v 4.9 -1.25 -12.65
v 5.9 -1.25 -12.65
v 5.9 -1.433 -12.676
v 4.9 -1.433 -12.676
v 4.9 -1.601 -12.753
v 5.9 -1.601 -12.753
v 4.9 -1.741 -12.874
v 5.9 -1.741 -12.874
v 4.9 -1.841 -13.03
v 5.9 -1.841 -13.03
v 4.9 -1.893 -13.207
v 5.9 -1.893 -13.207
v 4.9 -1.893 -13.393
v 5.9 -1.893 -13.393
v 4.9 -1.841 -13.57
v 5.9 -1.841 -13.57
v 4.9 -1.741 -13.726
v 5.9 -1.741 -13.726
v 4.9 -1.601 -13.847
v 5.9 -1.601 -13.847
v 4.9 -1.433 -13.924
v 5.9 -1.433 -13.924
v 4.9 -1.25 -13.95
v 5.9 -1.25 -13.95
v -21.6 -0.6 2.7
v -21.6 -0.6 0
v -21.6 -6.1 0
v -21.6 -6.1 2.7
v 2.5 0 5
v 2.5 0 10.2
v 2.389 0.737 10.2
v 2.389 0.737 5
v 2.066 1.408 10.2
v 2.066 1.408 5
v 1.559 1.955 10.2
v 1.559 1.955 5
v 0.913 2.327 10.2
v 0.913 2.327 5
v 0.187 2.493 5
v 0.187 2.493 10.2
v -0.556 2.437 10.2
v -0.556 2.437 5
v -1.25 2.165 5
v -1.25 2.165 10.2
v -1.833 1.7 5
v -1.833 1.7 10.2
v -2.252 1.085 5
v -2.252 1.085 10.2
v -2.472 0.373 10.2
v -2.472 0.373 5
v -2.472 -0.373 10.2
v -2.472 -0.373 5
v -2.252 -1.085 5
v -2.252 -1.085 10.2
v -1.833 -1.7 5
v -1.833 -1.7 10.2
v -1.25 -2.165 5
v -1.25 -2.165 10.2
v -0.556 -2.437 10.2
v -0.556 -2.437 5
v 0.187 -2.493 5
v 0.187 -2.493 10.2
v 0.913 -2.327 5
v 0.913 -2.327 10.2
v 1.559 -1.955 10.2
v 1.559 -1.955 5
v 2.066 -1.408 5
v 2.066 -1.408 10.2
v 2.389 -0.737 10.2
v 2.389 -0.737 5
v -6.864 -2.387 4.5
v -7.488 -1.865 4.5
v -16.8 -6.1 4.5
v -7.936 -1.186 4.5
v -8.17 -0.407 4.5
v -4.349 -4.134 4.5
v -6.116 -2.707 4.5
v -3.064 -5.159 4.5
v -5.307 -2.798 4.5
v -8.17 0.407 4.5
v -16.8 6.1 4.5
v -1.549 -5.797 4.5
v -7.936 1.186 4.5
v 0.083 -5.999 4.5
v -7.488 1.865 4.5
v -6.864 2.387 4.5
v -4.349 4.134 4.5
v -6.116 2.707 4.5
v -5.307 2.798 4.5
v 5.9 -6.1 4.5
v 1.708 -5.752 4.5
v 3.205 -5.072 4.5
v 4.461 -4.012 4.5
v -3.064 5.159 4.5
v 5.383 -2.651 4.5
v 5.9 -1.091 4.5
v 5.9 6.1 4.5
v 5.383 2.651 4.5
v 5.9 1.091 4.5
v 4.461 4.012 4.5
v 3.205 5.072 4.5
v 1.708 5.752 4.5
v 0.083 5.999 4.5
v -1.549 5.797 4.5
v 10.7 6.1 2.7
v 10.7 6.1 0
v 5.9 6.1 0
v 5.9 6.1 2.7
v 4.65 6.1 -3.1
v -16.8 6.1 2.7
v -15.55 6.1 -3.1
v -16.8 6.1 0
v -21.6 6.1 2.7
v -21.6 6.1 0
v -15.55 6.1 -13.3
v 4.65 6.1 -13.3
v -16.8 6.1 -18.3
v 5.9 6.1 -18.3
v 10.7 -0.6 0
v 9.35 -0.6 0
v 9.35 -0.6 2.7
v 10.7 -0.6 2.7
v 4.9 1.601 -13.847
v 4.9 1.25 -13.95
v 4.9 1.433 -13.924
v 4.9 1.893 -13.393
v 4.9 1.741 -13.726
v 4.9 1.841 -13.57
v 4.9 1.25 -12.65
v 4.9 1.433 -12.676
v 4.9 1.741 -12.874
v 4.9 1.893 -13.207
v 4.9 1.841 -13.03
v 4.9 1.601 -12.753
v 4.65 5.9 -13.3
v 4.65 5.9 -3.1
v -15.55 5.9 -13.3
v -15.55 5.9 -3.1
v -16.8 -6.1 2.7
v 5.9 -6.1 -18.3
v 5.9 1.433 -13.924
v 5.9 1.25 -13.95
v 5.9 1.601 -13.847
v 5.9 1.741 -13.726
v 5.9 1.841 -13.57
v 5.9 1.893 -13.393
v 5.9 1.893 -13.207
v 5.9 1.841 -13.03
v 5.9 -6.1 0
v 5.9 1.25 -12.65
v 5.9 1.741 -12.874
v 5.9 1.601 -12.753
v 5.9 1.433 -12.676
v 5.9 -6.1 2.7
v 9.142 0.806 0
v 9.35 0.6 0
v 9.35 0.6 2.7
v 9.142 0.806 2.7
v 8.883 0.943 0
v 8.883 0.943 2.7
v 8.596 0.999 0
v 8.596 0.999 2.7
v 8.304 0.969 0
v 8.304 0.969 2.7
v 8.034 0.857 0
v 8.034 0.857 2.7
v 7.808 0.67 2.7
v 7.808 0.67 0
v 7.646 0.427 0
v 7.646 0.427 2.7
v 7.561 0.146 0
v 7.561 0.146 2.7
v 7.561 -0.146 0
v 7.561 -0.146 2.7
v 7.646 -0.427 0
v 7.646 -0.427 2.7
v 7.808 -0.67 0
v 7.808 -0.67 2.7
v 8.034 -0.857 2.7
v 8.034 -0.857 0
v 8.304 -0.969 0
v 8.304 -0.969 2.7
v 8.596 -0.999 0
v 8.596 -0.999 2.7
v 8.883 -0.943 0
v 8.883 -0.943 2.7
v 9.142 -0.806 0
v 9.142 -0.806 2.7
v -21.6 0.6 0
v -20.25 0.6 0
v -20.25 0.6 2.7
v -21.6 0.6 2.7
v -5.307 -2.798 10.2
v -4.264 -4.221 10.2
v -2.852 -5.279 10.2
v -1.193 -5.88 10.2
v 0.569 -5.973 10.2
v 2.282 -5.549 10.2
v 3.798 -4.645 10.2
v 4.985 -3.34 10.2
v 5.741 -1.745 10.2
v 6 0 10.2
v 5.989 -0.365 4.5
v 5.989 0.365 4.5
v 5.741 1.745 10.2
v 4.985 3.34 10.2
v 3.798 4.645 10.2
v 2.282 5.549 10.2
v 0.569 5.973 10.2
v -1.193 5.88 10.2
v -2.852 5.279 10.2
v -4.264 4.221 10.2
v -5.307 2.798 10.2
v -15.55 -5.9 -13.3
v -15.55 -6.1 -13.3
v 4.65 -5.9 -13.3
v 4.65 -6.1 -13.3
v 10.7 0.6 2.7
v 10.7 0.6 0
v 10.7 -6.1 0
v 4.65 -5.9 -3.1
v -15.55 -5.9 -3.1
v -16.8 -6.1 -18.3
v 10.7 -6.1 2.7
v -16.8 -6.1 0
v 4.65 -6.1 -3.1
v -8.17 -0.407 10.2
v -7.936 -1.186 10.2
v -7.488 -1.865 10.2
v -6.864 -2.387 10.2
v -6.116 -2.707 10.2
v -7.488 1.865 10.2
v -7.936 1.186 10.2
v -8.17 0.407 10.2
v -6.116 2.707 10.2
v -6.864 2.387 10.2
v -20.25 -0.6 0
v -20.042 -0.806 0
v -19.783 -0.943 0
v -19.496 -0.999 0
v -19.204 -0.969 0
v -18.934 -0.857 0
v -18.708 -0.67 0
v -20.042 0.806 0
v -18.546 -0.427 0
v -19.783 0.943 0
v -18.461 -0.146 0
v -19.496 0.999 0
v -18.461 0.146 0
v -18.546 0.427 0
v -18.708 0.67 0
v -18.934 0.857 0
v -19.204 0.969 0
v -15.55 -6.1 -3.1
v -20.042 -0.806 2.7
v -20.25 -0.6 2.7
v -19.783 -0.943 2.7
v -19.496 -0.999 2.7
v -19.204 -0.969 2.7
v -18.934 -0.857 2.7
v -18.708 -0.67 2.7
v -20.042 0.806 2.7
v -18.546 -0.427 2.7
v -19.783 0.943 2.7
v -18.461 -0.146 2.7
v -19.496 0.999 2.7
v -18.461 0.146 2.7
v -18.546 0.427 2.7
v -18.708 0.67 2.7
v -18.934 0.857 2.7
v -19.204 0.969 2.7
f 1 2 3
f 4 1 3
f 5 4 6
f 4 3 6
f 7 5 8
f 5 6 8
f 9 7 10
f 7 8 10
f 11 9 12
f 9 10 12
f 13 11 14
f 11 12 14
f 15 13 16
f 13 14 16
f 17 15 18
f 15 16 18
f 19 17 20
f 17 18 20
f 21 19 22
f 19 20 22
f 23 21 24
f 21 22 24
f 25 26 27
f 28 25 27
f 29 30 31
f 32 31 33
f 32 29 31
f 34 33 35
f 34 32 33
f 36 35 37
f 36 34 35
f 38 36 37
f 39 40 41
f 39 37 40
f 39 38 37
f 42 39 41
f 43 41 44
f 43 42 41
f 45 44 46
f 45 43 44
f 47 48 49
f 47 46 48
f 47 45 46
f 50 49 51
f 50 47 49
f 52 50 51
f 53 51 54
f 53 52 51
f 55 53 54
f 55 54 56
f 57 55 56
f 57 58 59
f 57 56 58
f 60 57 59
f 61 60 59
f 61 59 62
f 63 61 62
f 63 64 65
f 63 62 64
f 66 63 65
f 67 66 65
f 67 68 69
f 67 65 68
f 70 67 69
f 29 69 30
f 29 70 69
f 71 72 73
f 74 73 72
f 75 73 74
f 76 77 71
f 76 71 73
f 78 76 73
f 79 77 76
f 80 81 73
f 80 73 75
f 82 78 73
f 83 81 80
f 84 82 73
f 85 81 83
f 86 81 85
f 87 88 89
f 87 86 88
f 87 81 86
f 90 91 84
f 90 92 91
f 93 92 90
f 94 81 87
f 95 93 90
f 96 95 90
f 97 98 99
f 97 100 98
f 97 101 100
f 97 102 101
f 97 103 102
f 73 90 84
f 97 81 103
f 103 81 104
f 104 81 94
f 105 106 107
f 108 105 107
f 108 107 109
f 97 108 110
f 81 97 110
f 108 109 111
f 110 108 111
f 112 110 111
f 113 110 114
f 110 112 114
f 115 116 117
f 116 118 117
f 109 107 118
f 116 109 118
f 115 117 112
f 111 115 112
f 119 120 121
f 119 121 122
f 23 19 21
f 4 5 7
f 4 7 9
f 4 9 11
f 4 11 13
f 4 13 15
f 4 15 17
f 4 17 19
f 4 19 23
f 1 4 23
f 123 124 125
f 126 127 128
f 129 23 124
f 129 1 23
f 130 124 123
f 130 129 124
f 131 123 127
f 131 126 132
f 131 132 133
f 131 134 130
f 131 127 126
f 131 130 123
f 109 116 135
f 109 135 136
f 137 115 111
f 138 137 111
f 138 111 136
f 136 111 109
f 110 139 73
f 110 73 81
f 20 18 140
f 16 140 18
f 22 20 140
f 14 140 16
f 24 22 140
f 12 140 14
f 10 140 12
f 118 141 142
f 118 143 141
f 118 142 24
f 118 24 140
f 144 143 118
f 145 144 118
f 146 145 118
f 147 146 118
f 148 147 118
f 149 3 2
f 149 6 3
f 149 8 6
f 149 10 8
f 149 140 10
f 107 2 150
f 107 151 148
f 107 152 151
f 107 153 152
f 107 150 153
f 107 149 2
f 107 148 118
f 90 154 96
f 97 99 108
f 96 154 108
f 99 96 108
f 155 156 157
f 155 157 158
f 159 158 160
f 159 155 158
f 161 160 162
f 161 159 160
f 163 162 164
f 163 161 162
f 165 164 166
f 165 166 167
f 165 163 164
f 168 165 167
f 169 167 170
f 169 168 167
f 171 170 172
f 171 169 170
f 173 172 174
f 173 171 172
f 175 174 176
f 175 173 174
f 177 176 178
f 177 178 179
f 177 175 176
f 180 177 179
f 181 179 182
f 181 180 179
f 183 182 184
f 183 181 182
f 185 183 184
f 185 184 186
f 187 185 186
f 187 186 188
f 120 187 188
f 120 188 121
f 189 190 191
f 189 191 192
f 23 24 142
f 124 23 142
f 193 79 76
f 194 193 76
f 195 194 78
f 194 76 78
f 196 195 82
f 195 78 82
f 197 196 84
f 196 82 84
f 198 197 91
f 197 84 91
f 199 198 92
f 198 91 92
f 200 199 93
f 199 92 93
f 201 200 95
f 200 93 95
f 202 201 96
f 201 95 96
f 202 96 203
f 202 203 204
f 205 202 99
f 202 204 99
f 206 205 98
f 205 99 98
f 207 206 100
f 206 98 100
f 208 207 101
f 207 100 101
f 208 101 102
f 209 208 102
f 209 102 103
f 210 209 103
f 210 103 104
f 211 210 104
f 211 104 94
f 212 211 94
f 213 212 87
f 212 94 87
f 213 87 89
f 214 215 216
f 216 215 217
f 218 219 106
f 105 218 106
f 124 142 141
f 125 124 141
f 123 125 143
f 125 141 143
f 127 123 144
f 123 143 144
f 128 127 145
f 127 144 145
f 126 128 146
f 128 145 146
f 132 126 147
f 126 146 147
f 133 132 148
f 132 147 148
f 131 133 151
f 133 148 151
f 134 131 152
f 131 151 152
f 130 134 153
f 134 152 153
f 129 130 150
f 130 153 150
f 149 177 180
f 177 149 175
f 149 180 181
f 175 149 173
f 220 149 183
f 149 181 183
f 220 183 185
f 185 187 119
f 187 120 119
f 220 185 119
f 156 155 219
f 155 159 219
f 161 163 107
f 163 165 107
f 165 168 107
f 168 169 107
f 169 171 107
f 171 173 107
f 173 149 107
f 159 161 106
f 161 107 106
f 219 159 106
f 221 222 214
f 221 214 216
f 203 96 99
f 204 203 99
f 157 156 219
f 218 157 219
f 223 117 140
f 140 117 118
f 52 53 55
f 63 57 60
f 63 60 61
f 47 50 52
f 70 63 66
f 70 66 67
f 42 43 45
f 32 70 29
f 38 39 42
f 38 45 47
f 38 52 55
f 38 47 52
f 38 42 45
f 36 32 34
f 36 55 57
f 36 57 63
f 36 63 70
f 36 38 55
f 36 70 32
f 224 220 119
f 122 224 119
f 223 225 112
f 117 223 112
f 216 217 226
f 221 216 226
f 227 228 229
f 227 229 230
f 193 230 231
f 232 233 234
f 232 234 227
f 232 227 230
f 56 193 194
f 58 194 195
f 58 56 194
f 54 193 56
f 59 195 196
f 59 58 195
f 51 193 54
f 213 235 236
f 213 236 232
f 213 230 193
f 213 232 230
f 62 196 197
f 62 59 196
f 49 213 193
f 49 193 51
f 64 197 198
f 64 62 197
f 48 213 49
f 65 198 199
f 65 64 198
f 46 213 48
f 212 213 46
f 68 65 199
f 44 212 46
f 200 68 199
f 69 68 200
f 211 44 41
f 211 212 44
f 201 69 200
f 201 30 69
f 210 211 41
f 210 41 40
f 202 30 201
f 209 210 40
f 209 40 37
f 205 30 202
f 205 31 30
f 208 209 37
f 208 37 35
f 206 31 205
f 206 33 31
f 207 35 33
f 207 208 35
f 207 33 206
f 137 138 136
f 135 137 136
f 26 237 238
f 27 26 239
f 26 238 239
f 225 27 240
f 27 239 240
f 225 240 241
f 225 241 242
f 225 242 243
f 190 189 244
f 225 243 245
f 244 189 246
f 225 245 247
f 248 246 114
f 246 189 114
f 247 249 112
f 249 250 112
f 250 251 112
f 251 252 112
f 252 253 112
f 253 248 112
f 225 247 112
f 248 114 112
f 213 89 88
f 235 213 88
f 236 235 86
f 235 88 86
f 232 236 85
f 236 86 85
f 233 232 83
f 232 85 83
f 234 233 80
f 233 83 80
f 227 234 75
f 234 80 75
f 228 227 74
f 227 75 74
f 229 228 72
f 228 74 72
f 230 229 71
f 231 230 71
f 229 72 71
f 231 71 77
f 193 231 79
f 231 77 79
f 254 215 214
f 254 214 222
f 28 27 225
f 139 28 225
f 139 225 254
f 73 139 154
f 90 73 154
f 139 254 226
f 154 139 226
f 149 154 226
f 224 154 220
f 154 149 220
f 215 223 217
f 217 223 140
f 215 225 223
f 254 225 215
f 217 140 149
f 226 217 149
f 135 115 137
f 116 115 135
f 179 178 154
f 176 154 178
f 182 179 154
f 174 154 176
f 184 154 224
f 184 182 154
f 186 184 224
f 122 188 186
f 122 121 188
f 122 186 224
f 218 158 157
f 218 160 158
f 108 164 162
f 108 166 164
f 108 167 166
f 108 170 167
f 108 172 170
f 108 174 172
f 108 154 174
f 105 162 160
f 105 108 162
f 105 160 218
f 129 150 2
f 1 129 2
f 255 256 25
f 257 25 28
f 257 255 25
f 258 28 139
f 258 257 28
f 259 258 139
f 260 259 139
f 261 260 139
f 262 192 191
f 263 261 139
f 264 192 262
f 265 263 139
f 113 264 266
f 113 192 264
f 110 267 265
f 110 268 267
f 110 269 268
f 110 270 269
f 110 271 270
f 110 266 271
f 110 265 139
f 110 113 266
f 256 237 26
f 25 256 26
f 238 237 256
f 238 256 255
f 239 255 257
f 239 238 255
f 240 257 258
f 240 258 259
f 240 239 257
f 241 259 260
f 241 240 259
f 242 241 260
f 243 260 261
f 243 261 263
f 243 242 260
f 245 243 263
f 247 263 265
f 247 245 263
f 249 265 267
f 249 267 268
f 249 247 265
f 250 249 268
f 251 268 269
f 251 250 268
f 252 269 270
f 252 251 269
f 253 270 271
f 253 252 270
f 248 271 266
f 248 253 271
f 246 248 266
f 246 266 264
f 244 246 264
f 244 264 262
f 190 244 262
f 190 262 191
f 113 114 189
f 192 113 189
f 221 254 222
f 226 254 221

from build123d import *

# Parameters (mm, degrees)
SKETCH_W        = 22.7
SKETCH_H        = 12.2
PAD_DEPTH       = 18.3
PAD001_DEPTH    = 2.7
SKETCH002_W     = 22.7
SKETCH002_H     = 12.2
PAD002_DEPTH    = 4.5
PAD003_DEPTH    = 5.7
SKETCH004_R     = 2.5
POCKET_DEPTH    = 10
POCKET001_DEPTH = 1
SKETCH010_W     = 20.2
SKETCH010_H     = 10.2
POCKET003_DEPTH = 0.2


with BuildPart() as part:
    # Sketch → Pad (new body)
    with BuildSketch(Plane.XY):
        with Locations((-5.45, 0)):
            Rectangle(SKETCH_W, SKETCH_H)
    extrude(amount=-PAD_DEPTH)

    # Sketch001 → Pad001 (join)
    with BuildSketch(Plane.XY):
        with BuildLine():
            Line((-21.6, 6.1), (-21.6, 0.6))
            Line((-20.25, 0.6), (-21.6, 0.6))
            ThreePointArc((-20.25, -0.6), (-18.45, 0), (-20.25, 0.6))
            Line((-20.25, -0.6), (-21.6, -0.6))
            Line((-21.6, -0.6), (-21.6, -6.1))
            Line((-21.6, -6.1), (10.7, -6.1))
            Line((10.7, -6.1), (10.7, -0.6))
            Line((9.35, -0.6), (10.7, -0.6))
            ThreePointArc((9.35, 0.6), (7.55, 0), (9.35, -0.6))
            Line((9.35, 0.6), (10.7, 0.6))
            Line((10.7, 0.6), (10.7, 6.1))
            Line((10.7, 6.1), (-21.6, 6.1))
        make_face()
    extrude(amount=PAD001_DEPTH)

    # Sketch002 → Pad002 (join)
    with BuildSketch(Plane.XY):
        with Locations((-5.45, 0)):
            Rectangle(SKETCH002_W, SKETCH002_H)
    extrude(amount=PAD002_DEPTH)

    # Sketch003 (on Face18 of Pad002) → Pad003 (join)
    with BuildSketch(Plane.XY.offset(4.5)):
        with BuildLine():
            ThreePointArc((-5.307407, -2.798469), (6, 0), (-5.307407, 2.798469))
            ThreePointArc((-5.307407, 2.798469), (-8.2, 0), (-5.307407, -2.798469))
        make_face()
    extrude(amount=PAD003_DEPTH)

    # Sketch004 → Pocket (cut)
    with BuildSketch(Plane.XY.offset(5)):
        Circle(SKETCH004_R)
    extrude(amount=POCKET_DEPTH, mode=Mode.SUBTRACT)

    # Sketch005 (on Face10 of Pocket) → Pocket001 (cut)
    with BuildSketch(Plane.YZ.offset(5.9)):
        with BuildLine():
            ThreePointArc((-1.25, -12.65), (-1.9, -13.3), (-1.25, -13.95))
            Line((-1.25, -13.95), (1.25, -13.95))
            ThreePointArc((1.25, -13.95), (1.9, -13.3), (1.25, -12.65))
            Line((1.25, -12.65), (-1.25, -12.65))
        make_face()
    extrude(amount=-POCKET001_DEPTH, mode=Mode.SUBTRACT)

    # Sketch010 (on Face14 of Pocket001) → Pocket003 (cut)
    with BuildSketch(Plane.XZ.offset(6.1)):
        with Locations((-5.45, -8.2)):
            Rectangle(SKETCH010_W, SKETCH010_H)
    pocket003 = extrude(amount=-POCKET003_DEPTH, mode=Mode.SUBTRACT)

    # Mirrored: Pocket003 across XZ
    add(pocket003.mirror(Plane.XZ), mode=Mode.SUBTRACT)


solid = part.part
